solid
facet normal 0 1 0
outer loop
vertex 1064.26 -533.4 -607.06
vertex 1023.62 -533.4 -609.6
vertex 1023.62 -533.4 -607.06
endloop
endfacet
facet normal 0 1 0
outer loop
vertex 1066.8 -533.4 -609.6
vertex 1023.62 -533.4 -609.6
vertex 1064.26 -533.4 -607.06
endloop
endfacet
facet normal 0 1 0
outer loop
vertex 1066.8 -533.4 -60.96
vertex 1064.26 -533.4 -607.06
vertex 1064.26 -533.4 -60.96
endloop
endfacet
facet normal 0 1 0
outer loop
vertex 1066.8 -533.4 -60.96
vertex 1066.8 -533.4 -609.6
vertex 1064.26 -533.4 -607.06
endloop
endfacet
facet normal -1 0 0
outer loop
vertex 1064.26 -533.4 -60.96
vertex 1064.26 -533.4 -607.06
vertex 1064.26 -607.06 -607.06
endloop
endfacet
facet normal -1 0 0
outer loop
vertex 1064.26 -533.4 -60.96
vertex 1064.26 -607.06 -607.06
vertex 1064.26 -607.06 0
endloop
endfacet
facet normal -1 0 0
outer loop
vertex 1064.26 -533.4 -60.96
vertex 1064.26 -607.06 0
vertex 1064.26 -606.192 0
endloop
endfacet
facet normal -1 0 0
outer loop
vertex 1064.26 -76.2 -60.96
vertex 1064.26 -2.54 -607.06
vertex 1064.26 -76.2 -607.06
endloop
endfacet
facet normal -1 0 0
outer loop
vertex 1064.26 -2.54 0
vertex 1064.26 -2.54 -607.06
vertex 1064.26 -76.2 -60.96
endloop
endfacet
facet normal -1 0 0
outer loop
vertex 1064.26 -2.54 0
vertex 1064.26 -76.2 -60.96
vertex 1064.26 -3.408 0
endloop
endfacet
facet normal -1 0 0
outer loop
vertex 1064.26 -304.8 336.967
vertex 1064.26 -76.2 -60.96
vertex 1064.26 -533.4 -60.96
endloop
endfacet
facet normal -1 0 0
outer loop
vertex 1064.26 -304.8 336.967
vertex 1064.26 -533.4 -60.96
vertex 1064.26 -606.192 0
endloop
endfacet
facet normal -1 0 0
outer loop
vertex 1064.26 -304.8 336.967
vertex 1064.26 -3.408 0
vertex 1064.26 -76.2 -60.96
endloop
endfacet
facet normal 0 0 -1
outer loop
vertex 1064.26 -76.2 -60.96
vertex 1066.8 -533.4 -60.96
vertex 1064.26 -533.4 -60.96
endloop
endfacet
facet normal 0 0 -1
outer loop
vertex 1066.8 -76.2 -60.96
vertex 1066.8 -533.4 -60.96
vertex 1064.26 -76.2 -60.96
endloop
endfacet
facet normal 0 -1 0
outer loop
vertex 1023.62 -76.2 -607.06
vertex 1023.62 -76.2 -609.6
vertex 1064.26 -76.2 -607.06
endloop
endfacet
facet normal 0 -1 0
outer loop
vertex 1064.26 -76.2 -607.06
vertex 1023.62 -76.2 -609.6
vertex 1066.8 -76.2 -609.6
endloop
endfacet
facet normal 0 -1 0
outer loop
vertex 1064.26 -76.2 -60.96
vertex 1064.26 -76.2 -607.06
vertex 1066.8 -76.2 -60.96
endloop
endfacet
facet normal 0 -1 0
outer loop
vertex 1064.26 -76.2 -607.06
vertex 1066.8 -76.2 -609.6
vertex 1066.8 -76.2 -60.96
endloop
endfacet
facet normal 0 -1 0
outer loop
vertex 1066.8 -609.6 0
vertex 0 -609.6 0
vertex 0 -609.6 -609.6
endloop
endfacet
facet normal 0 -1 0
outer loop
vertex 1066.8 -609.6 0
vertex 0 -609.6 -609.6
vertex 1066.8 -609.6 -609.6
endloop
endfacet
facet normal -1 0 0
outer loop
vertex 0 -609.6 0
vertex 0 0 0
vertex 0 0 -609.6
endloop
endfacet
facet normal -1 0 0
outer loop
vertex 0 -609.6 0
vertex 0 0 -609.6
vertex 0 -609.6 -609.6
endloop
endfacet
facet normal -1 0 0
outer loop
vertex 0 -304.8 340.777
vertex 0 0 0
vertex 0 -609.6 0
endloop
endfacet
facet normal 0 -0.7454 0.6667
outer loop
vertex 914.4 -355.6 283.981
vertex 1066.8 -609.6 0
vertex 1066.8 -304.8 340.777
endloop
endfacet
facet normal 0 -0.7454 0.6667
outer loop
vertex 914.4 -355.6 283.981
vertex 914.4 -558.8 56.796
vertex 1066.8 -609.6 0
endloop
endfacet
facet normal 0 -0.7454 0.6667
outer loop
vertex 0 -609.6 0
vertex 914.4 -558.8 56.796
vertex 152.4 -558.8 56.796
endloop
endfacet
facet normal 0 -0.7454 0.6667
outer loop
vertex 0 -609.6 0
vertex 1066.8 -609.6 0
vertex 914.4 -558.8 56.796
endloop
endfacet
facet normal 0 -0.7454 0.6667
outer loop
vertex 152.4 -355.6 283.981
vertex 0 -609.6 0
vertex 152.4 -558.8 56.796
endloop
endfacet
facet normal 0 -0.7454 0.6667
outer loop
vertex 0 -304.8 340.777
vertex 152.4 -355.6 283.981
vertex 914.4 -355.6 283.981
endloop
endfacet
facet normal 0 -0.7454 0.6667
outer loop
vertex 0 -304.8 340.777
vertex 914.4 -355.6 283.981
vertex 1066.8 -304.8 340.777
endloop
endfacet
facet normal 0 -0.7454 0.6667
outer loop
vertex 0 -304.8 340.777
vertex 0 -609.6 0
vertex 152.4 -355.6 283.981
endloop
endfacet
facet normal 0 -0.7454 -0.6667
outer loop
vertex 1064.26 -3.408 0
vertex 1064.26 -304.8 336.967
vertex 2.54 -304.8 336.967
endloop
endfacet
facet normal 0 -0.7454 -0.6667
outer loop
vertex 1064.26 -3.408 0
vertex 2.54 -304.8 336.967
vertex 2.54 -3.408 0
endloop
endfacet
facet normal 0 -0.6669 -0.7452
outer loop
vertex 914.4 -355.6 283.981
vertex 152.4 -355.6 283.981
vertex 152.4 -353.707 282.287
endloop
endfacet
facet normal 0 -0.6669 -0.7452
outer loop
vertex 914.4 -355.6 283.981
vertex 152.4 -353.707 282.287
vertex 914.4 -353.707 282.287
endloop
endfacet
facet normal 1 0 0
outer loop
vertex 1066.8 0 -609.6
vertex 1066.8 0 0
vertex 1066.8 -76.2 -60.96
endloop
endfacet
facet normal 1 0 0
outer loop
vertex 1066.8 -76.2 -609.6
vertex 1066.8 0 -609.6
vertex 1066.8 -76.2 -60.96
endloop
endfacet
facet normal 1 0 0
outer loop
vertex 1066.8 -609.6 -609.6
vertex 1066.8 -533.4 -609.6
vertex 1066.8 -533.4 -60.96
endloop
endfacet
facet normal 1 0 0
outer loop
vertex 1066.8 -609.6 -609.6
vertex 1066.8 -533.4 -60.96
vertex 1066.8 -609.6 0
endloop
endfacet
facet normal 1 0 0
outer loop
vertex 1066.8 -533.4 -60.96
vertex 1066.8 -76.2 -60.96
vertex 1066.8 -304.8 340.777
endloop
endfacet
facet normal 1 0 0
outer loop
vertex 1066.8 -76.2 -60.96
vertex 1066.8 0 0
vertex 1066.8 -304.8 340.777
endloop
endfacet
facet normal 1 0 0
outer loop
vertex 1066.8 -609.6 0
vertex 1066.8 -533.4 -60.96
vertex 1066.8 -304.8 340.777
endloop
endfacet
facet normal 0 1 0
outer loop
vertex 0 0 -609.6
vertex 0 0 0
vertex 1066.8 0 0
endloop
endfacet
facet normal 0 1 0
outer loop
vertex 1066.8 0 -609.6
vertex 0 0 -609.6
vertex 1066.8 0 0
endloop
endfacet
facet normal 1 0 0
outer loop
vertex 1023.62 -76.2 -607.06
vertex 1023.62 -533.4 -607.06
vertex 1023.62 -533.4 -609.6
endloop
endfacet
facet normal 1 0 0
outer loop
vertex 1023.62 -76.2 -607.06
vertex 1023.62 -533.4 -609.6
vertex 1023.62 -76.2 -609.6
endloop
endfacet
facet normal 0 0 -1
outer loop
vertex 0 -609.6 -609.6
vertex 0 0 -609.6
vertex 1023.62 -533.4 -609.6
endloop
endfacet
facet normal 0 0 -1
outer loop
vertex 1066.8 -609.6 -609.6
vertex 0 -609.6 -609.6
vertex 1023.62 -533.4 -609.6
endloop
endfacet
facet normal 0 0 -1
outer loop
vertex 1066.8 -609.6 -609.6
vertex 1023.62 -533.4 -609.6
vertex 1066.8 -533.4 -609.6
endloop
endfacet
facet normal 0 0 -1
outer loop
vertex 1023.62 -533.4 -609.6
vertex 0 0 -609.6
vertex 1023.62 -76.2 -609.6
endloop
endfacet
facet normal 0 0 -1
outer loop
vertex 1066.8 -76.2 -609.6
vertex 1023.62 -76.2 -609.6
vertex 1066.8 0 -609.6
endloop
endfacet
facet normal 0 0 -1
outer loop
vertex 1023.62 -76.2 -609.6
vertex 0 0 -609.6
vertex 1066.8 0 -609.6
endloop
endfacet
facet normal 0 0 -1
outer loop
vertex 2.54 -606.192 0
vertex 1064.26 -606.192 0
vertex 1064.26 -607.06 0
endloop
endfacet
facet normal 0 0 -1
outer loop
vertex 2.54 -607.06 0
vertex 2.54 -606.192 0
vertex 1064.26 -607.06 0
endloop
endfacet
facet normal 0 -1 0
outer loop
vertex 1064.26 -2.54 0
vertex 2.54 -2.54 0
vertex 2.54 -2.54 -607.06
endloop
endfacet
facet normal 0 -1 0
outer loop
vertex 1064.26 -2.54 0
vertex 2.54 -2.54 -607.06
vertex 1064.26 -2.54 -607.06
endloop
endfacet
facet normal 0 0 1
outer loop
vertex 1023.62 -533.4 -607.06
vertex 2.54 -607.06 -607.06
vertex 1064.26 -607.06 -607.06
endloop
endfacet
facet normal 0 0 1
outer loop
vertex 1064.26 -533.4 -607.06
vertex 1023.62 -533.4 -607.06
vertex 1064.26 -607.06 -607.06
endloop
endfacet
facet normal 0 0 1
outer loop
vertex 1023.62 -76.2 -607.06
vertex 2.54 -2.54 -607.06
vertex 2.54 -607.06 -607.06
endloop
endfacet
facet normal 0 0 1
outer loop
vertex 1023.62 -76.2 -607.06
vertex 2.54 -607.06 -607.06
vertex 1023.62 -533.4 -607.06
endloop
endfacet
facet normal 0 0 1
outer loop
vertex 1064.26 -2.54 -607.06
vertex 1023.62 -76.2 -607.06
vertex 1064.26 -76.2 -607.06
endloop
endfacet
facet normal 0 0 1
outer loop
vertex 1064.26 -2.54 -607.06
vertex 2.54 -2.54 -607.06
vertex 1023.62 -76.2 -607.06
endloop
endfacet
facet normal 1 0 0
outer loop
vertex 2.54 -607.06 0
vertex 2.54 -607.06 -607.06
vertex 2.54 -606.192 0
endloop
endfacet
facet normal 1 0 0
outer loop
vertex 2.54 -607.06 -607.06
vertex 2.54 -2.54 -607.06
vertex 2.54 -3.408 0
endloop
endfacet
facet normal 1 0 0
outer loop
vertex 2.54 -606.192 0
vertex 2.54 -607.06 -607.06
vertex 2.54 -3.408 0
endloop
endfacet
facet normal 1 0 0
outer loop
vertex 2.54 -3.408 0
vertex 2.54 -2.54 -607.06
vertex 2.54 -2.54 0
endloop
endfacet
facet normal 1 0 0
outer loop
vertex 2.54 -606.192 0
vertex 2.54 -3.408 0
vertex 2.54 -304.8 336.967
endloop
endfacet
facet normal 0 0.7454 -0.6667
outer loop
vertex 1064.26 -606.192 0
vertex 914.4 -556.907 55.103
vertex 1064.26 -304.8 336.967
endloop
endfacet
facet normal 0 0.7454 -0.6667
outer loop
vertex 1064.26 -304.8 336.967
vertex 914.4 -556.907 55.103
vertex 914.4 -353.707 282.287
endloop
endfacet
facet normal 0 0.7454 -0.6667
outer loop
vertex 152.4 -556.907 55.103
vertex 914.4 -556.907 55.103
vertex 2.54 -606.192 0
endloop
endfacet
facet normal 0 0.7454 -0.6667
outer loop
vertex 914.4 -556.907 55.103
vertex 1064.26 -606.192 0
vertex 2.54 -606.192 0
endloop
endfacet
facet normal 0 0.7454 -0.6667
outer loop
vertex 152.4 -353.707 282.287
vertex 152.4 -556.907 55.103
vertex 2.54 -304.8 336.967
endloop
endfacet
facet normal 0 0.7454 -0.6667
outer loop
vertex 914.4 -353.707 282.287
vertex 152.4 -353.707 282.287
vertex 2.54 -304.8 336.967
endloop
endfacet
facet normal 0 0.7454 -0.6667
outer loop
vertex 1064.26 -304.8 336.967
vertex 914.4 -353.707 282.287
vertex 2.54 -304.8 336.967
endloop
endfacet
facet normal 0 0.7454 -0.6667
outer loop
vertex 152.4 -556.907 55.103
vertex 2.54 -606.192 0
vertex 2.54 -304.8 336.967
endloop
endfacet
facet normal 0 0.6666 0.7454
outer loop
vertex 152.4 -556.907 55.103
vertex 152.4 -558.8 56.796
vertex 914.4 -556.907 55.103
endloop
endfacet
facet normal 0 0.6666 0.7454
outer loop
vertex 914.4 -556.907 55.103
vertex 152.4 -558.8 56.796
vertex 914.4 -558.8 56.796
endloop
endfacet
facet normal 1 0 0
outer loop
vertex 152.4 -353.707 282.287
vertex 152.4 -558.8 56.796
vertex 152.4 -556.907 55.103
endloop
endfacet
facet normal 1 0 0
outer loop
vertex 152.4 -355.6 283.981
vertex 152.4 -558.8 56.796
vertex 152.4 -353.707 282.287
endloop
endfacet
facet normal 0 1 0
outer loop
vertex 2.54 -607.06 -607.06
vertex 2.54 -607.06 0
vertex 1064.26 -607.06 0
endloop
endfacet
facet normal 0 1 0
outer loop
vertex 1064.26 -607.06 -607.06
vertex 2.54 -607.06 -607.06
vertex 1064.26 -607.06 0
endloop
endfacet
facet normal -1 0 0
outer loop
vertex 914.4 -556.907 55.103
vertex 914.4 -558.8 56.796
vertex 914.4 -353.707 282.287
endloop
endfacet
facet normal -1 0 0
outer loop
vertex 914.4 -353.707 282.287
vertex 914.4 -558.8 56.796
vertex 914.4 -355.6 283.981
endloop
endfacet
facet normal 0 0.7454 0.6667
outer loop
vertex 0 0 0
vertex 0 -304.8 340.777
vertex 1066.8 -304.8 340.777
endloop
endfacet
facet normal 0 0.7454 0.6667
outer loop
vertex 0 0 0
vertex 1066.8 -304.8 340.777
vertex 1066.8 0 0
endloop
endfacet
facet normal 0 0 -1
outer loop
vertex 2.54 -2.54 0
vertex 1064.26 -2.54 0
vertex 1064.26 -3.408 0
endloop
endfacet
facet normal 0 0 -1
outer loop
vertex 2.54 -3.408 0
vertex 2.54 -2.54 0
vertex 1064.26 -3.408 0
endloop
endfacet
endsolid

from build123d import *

# Parameters (mm, degrees)
F0_W         = 1066.8
F0_H         = 609.6
F1_DEPTH     = 609.6
F2_T         = -2.54
F3_W         = 457.2
F3_H         = 548.64
F4_DEPTH     = 43.18
F6_DEPTH     = 1066.8
F7_T         = 2.54
F7_T3_DEPTH  = 7.62
F7_T5_DEPTH  = 7.62
F7_T7_DEPTH  = 612.14
F7_T9_DEPTH  = 78.74
F7_T11_DEPTH = 78.74
F7_T13_DEPTH = 1066.8
F7_T15_DEPTH = 609.6
F8_W         = 762
F8_H         = 304.8
F9_DEPTH     = 25.4


# Not quite as in the source:
# - a shell that OpenCascade refuses in one call is made with other operations: the cavity is built on its own and cut out


with BuildPart() as f1:
    # F0 (on Front) → F1 (new body)
    with BuildSketch(Plane.XZ):
        with Locations((533.4, -304.8)):
            Rectangle(F0_W, F0_H)
    extrude(amount=F1_DEPTH)

    # F2
    f2_openings = [f1.faces().sort_by_distance(p)[0] for p in [
        (533.4, -304.8, 0),
    ]]
    offset(amount=F2_T, openings=f2_openings)

    # F3 (on face) → F4 (cut)
    with BuildSketch(Plane.YZ.offset(1066.8)):
        with Locations((-304.8, -335.28)):
            Rectangle(F3_W, F3_H)
    extrude(amount=-F4_DEPTH, mode=Mode.SUBTRACT)

    # F5 (on face) → F6 (join)
    with BuildSketch(Plane(origin=(0, 0, 0), x_dir=(0, -1, 0), z_dir=(-1, 0, 0))):
        Polygon((304.8, 340.776759771), (0, 0), (609.6, 0), align=None)
    extrude(amount=-F6_DEPTH)

    # F7: shell of thickness 2.54, made by hand


with BuildPart() as f7_core1:
    # F7_t2: copy of F1
    add(f1.part)

    # the walls: a layer under each face that stays
    f7_faces = [f7_core1.faces().sort_by_distance(p)[0] for p in [
        (0, -304.8, -134.4116201145),
        (533.4, -304.8, -609.6),
        (533.4, 0, -304.8),
        (533.4, -609.6, -304.8),
        (533.4, -152.4, 170.3883798855),
        (533.4, -457.2, 170.3883798855),
        (1066.8, -304.8, 182.3806331425),
        (1065.3606666667, -76.2, -591.312),
        (1023.62, -304.8, -608.33),
        (1065.3606666667, -533.4, -79.248),
        (1065.53, -304.8, -60.96),
        (1064.26, -563.88, -563.6985714286),
        (533.4, -304.8, -607.06),
        (533.4, -607.06, -303.53),
        (533.4, -2.54, -303.53),
        (2.54, -304.8, -303.53),
    ]]
    thicken(f7_faces, amount=-F7_T, mode=Mode.SUBTRACT)

    # F7_s4 → F7_t3 (cut)
    with BuildSketch(Plane.YZ.offset(1061.72)):
        Polygon((-76.2254, -60.9854), (-73.66, -60.96), (-73.66, -58.42), (-76.2, -58.42), align=None)
        Polygon((-533.3746, -60.9854), (-535.94, -60.96), (-535.94, -58.42), (-533.4, -58.42), align=None)
    extrude(amount=F7_T3_DEPTH, mode=Mode.SUBTRACT)

    # F7_s6 → F7_t5 (cut)
    with BuildSketch(Plane.XY.offset(-612.14)):
        Polygon((1023.6454, -76.2254), (1023.62, -73.66), (1021.08, -73.66), (1021.08, -76.2), align=None)
        Polygon((1023.6454, -533.3746), (1021.08, -533.4), (1021.08, -535.94), (1023.62, -535.94), align=None)
    extrude(amount=F7_T5_DEPTH, mode=Mode.SUBTRACT)

    # F7_s8 → F7_t7 (cut)
    with BuildSketch(Plane.XY.offset(-609.6)):
        Polygon((1064.2346, -607.0346), (1066.8, -607.06), (1066.8, -609.6), (1064.26, -609.6), align=None)
        Polygon((1064.2346, -2.5654), (1066.8, -2.54), (1066.8, 0), (1064.26, 0), align=None)
        Polygon((2.5654, -607.0346), (2.54, -609.6), (0, -609.6), (0, -607.06), align=None)
        Polygon((2.5654, -2.5654), (2.54, 0), (0, 0), (0, -2.54), align=None)
    extrude(amount=F7_T7_DEPTH, mode=Mode.SUBTRACT)

    # F7_s10 → F7_t9 (cut)
    with BuildSketch(Plane.XZ.offset(530.86)):
        Polygon((1064.2346, -607.0346), (1066.8, -607.06), (1066.8, -609.6), (1064.26, -609.6), align=None)
    extrude(amount=F7_T9_DEPTH, mode=Mode.SUBTRACT)

    # F7_s12 → F7_t11 (cut)
    with BuildSketch(Plane.XZ):
        Polygon((1064.2346, -607.0346), (1066.8, -607.06), (1066.8, -609.6), (1064.26, -609.6), align=None)
    extrude(amount=F7_T11_DEPTH, mode=Mode.SUBTRACT)

    # F7_s14 → F7_t13 (cut)
    with BuildSketch(Plane.YZ):
        Polygon((-607.0346, -607.0346), (-607.06, -609.6), (-609.6, -609.6), (-609.6, -607.06), align=None)
        Polygon((-2.5654, -607.0346), (-2.54, -609.6), (0, -609.6), (0, -607.06), align=None)
    extrude(amount=F7_T13_DEPTH, mode=Mode.SUBTRACT)

    # F7_s16 → F7_t15 (cut)
    with BuildSketch(Plane.XZ):
        Polygon((2.5654, -607.0346), (2.54, -609.6), (0, -609.6), (0, -607.06), align=None)
    extrude(amount=F7_T15_DEPTH, mode=Mode.SUBTRACT)


with BuildPart() as f1_1:
    add(f1.part)

    # what is left inside the walls is the cavity
    f7_cavity = [f7_core1.part.solids().sort_by_distance(p)[0] for p in [
        (710.353333, -304.8, 0.0254),
    ]]
    add(f7_cavity, mode=Mode.SUBTRACT)

    # F8 (on face) → F9 (cut)
    with BuildSketch(Plane(origin=(0, -338.6666666667, 302.912675352), x_dir=(1, 0, 0), z_dir=(0, -0.7453559925, 0.6666666667))):
        with Locations((533.4, -177.8)):
            Rectangle(F8_W, F8_H)
    extrude(amount=-F9_DEPTH, mode=Mode.SUBTRACT)


solid = f1_1.part
